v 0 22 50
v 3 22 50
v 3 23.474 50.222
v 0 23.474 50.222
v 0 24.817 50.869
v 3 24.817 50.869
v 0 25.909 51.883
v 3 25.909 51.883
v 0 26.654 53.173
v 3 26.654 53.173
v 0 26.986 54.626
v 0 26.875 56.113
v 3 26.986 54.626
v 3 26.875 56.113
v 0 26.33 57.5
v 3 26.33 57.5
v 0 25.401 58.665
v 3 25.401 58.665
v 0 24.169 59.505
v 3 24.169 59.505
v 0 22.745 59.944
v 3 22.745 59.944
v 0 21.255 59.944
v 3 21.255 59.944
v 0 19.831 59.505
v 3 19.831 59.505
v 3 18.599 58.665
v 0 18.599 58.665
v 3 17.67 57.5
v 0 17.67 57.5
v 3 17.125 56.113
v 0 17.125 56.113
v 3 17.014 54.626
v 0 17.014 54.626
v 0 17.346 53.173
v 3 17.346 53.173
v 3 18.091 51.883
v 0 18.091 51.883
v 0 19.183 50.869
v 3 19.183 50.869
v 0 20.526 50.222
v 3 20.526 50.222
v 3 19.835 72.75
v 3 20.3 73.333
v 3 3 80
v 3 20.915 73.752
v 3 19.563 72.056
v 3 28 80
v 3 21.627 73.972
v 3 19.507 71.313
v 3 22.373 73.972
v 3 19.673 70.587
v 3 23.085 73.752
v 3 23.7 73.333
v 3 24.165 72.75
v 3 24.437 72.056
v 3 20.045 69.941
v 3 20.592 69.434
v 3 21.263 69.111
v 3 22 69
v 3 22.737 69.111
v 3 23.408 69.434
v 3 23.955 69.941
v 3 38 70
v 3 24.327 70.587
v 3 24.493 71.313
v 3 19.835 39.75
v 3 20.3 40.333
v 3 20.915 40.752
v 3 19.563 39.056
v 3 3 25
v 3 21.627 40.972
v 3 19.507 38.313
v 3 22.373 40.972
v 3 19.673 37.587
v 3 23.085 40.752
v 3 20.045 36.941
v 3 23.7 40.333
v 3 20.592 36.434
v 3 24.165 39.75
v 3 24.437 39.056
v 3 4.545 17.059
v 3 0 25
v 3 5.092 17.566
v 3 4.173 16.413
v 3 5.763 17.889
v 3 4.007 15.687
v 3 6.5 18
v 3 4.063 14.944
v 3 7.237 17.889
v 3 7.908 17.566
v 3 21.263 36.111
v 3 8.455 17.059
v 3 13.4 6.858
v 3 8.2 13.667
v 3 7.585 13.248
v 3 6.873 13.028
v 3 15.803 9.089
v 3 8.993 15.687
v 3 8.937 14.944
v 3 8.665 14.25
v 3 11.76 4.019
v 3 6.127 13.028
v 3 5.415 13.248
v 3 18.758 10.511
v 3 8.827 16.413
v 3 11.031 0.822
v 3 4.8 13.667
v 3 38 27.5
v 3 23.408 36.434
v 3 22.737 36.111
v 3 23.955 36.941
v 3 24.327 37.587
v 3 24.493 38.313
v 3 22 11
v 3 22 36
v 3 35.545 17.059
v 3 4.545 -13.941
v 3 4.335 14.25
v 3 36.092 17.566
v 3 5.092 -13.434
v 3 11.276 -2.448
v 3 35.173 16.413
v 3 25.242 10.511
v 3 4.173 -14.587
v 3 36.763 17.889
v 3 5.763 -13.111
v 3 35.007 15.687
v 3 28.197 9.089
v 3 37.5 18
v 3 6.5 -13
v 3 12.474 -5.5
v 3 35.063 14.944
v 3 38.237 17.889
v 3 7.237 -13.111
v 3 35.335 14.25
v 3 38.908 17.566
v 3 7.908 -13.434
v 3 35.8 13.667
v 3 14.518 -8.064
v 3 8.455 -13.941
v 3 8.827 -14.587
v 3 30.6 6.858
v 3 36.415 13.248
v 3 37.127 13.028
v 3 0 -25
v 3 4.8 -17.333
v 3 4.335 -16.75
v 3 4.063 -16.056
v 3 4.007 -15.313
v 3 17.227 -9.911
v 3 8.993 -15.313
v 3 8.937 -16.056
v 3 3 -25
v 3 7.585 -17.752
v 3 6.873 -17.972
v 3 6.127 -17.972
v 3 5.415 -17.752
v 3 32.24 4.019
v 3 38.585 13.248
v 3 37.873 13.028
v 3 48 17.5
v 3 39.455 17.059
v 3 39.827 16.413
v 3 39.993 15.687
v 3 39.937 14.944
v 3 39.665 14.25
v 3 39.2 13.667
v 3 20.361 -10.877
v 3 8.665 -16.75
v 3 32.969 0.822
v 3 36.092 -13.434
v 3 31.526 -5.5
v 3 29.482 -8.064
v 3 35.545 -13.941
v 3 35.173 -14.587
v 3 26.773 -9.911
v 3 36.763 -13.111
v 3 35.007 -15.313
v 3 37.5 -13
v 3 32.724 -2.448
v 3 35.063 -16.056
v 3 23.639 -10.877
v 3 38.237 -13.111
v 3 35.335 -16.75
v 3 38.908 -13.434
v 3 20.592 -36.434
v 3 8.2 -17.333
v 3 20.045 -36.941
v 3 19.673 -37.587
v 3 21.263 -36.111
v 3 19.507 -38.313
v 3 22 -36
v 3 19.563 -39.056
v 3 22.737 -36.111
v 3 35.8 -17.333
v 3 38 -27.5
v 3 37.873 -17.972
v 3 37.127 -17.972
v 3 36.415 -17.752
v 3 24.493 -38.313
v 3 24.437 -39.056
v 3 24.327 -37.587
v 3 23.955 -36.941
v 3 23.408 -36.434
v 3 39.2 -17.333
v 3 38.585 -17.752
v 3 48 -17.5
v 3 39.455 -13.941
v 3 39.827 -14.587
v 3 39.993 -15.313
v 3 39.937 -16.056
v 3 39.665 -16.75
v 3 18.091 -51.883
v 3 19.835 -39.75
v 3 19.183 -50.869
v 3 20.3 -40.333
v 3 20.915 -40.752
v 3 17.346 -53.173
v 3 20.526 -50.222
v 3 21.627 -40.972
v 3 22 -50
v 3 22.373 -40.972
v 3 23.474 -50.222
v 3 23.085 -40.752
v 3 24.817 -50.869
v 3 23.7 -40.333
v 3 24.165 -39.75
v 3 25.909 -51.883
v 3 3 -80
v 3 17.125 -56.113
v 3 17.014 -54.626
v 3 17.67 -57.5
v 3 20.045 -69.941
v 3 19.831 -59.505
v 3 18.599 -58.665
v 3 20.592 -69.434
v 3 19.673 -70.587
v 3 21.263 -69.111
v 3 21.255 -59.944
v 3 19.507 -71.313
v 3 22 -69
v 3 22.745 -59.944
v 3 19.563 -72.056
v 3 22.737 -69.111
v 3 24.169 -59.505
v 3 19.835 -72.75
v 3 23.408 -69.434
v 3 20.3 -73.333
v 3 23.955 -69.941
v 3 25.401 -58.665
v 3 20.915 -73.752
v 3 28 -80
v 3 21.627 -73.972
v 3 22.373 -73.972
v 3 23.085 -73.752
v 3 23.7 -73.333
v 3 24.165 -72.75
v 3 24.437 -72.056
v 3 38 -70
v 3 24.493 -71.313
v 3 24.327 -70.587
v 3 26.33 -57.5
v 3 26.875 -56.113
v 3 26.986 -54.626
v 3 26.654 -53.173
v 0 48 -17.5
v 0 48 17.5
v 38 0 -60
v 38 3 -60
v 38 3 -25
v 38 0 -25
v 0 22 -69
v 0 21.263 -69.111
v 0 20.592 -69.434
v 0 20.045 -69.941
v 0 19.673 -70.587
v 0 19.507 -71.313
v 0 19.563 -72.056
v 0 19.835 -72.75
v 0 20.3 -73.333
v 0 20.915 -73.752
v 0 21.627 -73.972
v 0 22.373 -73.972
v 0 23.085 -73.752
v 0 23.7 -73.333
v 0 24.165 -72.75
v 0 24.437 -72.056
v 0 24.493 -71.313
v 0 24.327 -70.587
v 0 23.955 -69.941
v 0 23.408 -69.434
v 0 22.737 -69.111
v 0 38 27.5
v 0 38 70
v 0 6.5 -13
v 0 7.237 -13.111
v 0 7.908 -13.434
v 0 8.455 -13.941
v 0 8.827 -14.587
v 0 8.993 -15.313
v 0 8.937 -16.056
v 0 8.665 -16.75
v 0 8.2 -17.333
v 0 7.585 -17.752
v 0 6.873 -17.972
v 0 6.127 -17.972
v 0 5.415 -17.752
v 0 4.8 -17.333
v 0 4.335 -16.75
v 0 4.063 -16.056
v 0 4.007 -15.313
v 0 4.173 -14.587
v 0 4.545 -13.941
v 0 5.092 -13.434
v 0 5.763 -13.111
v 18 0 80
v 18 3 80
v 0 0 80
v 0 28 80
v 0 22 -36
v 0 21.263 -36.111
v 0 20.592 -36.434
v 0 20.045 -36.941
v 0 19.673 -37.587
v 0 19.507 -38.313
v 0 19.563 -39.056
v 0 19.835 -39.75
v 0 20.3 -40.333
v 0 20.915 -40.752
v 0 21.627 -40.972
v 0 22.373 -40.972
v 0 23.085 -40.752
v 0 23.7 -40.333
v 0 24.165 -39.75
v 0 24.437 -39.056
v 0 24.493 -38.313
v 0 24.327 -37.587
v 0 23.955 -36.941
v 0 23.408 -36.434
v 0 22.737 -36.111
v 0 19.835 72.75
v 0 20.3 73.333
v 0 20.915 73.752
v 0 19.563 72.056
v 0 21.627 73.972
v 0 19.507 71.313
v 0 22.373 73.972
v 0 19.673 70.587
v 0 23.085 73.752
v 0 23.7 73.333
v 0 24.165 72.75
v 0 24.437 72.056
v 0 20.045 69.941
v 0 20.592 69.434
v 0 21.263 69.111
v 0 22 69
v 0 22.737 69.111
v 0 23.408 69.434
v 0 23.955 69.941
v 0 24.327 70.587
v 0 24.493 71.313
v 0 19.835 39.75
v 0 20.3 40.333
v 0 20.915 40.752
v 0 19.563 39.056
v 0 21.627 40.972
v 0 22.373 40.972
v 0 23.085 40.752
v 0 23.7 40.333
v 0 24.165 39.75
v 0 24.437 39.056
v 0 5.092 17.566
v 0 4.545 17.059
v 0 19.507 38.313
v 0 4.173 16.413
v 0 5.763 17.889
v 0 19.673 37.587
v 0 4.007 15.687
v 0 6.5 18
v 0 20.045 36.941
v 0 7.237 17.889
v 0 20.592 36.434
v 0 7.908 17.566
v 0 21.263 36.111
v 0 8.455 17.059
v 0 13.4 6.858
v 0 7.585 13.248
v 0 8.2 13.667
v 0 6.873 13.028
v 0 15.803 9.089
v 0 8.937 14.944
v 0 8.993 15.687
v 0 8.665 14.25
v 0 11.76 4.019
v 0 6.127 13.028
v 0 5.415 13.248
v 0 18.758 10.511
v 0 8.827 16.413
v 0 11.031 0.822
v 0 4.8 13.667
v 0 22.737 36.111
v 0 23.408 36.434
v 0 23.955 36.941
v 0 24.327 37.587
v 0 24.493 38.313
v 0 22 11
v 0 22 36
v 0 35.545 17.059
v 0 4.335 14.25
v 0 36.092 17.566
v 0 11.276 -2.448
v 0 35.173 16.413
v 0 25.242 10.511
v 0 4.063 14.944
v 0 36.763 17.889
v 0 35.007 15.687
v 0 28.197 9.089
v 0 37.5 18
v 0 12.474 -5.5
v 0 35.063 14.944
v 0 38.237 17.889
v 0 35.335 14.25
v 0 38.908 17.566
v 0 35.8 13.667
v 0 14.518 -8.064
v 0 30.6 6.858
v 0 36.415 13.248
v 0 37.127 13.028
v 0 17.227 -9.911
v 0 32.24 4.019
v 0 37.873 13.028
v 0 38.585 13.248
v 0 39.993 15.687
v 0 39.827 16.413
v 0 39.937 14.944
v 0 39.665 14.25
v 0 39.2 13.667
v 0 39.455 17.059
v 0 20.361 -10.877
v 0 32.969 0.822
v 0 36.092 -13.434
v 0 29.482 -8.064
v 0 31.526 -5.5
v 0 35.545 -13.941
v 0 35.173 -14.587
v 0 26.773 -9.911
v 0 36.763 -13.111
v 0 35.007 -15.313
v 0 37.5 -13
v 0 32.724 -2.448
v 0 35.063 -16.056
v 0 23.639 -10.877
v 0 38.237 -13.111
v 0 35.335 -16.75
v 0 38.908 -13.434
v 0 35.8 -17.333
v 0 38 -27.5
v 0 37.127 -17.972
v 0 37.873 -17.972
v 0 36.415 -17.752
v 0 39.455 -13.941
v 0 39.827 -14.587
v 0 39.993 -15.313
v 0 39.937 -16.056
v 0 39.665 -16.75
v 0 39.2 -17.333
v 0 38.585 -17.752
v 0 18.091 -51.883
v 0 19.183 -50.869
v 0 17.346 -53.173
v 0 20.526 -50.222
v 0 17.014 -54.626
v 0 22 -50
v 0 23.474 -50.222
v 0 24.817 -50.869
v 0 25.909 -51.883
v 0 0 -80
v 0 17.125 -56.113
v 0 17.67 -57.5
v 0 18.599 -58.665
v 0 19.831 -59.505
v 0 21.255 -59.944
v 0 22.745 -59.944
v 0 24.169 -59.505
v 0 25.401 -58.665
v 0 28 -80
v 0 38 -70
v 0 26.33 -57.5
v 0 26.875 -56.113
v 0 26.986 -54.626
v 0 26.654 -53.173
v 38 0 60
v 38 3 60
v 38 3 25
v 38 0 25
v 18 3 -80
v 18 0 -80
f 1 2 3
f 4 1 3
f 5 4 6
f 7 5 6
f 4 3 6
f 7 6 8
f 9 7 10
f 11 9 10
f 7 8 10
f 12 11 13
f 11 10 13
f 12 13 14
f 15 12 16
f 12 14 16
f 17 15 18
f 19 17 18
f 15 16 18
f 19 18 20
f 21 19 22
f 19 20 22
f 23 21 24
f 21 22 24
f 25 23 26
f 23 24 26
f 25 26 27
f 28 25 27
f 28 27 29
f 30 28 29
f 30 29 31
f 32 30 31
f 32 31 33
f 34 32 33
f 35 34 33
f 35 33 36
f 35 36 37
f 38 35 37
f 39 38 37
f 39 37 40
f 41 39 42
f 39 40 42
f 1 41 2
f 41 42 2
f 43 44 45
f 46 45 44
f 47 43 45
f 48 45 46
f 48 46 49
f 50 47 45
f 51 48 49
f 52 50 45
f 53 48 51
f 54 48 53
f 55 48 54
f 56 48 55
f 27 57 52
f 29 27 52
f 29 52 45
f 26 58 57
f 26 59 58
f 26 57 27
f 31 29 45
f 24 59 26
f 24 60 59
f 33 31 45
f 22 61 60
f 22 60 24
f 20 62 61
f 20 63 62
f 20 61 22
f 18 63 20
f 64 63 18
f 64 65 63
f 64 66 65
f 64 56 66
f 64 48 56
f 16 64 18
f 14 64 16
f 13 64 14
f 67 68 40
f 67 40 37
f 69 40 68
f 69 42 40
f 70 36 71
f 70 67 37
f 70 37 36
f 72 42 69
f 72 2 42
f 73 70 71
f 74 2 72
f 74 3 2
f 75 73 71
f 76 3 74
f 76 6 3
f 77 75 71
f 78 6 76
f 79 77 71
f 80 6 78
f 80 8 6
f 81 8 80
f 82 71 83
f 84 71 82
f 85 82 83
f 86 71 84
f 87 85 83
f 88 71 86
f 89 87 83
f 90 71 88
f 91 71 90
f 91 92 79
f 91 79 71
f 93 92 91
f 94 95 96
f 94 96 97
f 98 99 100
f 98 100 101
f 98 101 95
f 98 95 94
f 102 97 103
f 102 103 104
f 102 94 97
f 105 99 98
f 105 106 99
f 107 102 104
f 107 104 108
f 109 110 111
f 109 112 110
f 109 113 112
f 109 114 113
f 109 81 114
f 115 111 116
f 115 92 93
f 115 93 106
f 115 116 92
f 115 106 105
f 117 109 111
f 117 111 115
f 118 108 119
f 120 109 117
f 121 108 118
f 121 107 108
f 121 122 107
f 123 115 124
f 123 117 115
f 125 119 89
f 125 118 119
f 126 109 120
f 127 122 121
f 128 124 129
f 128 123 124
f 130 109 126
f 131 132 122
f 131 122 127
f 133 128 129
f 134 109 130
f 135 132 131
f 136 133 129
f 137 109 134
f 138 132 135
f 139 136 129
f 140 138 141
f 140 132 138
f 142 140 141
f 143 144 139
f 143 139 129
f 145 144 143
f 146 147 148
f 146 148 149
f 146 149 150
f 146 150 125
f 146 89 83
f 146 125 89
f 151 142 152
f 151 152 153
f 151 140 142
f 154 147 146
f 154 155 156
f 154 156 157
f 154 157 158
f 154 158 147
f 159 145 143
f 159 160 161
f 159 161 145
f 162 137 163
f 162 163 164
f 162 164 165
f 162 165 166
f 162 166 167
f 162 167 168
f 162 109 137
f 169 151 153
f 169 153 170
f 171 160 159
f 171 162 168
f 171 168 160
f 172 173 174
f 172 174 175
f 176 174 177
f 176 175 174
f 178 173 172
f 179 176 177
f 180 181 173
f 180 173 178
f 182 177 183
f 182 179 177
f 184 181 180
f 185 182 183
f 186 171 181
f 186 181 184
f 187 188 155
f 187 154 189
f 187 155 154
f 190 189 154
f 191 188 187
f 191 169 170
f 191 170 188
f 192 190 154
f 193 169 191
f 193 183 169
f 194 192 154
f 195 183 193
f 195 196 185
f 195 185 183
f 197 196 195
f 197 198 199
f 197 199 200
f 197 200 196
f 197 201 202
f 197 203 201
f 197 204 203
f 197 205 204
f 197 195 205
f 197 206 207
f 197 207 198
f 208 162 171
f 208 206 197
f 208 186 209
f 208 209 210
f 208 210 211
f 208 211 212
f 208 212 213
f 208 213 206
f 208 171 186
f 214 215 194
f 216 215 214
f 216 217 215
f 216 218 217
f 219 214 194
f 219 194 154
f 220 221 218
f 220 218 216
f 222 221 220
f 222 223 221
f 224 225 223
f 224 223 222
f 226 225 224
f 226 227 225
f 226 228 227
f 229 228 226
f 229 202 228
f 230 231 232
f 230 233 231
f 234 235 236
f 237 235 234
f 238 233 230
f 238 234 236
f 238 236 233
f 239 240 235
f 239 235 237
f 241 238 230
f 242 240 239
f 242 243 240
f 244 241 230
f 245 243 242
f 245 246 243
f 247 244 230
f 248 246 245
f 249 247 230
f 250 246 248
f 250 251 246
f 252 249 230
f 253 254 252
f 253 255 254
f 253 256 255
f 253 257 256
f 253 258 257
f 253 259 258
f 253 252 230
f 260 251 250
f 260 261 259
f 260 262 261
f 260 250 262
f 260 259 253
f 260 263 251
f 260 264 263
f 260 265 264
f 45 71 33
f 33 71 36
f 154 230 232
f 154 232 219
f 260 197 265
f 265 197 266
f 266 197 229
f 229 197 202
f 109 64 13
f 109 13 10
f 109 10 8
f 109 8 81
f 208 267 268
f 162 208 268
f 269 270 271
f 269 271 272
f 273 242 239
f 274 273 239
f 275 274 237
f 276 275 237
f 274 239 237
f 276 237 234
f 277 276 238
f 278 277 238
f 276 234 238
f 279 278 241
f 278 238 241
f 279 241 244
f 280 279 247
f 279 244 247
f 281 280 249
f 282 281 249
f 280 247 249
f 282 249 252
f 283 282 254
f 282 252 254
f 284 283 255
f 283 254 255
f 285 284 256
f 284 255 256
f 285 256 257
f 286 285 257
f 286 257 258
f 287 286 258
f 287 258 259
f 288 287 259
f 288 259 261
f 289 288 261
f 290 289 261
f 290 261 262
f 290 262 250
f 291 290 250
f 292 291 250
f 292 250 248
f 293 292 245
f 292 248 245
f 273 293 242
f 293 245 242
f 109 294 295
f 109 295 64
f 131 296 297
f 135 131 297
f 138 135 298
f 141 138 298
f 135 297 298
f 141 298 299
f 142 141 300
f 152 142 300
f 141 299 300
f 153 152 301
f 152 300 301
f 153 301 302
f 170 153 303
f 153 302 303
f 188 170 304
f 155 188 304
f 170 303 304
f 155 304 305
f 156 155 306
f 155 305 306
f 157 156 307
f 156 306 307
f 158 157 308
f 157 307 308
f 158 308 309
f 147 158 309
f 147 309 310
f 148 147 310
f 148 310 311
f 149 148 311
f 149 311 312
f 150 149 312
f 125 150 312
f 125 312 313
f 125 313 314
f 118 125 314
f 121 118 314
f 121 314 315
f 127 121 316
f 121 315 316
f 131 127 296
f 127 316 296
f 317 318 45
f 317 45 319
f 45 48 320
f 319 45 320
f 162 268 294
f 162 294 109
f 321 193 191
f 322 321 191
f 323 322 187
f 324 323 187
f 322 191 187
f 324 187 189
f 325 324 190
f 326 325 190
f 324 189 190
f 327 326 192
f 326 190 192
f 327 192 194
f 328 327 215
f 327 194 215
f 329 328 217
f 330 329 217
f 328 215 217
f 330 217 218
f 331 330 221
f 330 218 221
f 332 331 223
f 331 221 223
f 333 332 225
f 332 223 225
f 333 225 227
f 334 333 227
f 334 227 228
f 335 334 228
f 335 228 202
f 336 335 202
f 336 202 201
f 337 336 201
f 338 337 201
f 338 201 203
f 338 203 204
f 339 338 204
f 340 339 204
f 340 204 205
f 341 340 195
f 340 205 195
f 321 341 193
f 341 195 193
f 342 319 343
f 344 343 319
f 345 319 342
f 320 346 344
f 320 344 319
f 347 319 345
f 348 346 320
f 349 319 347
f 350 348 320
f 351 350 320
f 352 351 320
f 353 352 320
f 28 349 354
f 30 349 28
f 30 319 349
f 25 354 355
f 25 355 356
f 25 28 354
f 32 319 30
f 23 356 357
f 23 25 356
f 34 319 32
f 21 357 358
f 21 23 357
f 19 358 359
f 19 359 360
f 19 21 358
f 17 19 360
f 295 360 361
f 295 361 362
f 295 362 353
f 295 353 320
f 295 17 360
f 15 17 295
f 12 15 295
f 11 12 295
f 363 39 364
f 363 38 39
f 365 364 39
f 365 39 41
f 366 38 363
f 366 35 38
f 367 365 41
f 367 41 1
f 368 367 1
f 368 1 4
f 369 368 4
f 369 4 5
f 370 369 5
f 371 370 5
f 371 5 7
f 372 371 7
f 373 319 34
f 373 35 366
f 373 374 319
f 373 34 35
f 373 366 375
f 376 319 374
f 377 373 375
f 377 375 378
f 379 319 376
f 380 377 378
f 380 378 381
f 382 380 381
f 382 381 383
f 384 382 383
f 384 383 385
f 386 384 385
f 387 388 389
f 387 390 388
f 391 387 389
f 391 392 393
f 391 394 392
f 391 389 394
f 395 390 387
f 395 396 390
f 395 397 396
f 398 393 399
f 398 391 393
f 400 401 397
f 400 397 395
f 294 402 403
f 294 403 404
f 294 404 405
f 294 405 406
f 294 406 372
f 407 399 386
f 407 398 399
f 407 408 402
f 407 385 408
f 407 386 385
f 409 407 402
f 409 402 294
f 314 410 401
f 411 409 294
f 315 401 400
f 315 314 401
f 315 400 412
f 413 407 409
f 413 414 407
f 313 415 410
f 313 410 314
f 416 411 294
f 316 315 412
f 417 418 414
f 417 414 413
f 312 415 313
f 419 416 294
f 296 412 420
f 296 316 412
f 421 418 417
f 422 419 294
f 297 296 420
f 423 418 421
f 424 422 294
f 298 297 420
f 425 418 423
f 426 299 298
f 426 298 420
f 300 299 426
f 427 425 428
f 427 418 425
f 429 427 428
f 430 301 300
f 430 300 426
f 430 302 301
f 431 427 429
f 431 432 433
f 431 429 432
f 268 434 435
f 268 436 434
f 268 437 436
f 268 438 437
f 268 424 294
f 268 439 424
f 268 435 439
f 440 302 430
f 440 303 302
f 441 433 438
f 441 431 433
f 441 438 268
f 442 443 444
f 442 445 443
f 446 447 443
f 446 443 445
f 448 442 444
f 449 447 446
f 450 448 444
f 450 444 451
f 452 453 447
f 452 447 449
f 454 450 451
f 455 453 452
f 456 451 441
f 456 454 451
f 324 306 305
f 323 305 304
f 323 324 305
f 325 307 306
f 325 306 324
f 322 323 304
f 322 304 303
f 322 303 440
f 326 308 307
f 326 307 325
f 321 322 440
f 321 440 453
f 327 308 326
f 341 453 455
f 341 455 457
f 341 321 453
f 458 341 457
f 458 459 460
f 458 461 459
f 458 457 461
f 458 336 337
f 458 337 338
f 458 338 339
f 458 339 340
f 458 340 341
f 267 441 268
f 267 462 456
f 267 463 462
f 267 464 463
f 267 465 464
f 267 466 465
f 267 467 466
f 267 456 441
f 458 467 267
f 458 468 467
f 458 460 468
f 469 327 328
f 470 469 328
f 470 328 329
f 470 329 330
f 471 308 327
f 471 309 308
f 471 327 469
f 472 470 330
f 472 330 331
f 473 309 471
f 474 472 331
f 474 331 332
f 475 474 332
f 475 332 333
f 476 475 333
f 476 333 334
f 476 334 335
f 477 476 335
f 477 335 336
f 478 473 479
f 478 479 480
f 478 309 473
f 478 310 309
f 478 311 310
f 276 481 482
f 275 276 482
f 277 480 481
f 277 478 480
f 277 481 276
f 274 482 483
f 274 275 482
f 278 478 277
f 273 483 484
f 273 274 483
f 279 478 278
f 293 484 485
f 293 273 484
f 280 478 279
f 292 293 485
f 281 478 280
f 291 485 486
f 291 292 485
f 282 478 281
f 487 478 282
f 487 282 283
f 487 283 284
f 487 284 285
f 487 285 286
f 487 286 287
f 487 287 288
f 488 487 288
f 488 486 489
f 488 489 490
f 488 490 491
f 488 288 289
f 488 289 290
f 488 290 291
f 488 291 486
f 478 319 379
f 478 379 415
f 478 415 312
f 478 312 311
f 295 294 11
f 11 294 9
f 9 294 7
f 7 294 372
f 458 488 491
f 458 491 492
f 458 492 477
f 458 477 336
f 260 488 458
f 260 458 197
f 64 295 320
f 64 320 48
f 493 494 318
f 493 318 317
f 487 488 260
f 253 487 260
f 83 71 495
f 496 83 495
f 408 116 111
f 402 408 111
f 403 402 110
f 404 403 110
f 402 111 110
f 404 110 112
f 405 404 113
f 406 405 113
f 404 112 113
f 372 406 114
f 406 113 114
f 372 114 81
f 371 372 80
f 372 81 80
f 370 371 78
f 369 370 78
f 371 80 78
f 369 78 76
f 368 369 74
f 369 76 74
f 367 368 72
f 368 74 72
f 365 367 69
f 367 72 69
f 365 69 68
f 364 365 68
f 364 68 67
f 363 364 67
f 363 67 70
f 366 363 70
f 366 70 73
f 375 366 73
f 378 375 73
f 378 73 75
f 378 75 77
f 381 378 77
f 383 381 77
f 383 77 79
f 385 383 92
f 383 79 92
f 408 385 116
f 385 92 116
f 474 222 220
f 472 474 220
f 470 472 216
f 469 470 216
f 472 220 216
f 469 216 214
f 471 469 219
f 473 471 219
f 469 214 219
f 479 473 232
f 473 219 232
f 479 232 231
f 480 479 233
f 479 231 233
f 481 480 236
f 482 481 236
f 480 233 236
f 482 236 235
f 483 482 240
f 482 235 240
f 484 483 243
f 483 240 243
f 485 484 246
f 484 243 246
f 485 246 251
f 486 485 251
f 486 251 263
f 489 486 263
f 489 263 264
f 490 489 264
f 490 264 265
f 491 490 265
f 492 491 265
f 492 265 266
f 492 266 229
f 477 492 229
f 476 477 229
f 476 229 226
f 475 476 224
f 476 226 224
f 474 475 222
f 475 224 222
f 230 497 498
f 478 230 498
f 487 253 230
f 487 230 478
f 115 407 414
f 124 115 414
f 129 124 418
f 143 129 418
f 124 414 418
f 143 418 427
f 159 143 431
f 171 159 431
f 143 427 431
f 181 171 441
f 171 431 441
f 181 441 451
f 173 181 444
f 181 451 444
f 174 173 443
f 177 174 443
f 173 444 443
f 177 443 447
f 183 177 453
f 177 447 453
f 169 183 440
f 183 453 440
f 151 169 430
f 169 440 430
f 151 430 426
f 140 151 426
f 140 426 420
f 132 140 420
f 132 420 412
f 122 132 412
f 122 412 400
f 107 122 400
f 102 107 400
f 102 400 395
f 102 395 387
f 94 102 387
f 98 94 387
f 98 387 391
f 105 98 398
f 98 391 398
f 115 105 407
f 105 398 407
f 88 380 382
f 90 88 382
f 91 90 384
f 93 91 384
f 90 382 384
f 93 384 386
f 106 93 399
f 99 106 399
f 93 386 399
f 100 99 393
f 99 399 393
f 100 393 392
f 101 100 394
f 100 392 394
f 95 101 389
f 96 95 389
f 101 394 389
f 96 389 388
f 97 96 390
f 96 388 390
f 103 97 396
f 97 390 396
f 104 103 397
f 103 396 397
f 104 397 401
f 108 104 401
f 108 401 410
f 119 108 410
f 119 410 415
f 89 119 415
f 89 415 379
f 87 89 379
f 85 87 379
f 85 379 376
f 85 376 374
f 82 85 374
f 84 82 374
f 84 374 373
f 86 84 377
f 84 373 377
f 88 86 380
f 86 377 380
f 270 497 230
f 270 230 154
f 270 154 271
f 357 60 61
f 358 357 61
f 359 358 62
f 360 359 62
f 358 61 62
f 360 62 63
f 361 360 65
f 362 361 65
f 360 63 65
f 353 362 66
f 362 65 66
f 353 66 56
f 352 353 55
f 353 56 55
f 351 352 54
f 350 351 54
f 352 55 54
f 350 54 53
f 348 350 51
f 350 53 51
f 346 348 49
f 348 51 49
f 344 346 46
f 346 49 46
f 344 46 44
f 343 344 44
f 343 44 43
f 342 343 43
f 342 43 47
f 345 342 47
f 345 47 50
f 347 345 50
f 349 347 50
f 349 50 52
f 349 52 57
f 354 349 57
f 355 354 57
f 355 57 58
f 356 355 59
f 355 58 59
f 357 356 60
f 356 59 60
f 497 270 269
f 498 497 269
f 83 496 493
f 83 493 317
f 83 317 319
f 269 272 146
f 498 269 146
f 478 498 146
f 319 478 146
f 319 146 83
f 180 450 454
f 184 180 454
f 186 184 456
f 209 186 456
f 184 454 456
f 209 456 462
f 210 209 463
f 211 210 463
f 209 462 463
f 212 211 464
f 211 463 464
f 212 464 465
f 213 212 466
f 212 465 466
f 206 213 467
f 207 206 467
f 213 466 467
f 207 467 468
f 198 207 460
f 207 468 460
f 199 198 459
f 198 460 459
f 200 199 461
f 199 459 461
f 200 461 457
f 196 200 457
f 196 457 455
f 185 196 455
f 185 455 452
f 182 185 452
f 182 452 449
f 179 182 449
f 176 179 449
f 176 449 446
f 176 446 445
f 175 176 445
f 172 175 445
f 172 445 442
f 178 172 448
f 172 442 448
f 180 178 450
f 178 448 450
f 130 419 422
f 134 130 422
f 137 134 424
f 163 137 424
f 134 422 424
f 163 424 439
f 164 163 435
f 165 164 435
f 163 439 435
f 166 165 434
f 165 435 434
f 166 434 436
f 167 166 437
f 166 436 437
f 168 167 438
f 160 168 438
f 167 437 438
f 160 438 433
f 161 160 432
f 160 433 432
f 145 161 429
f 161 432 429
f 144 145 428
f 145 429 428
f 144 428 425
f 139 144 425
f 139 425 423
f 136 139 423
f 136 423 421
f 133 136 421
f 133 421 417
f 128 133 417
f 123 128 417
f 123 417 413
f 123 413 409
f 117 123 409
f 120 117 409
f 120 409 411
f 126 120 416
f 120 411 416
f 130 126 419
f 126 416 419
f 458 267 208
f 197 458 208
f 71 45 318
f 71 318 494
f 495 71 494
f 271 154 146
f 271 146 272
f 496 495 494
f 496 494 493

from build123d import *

# Parameters (mm, degrees)
SALIENTE_EXTRUIR1_DEPTH      = 80
SALIENTE_EXTRUIR1_DEPTH_BACK = 80
CROQUIS2_W                   = 35
CROQUIS2_H                   = 50
CORTAR_EXTRUIR1_DEPTH        = 3
CHAFL_N1_SIZE                = 20
CROQUIS3_R                   = 5
CROQUIS3_R_2                 = 2.5
CORTAR_EXTRUIR2_DEPTH        = 3
CROQUIS4_W                   = 55
CROQUIS4_H                   = 10
SALIENTE_EXTRUIR2_DEPTH      = 3
CROQUIS5_R                   = 2.5
CROQUIS5_R_2                 = 11
CORTAR_EXTRUIR3_DEPTH        = 3
CHAFL_N2_SIZE                = 10


with BuildPart() as part:
    # Croquis1 → Saliente-Extruir1 (new, two sides: drawn at the far end of the back side and taken through both)
    with BuildSketch(Plane.XY.offset(-SALIENTE_EXTRUIR1_DEPTH_BACK)):
        Polygon((0, 0), (0, 38), (3, 38), (3, 3), (38, 3), (38, 0), align=None)
    extrude(amount=SALIENTE_EXTRUIR1_DEPTH + SALIENTE_EXTRUIR1_DEPTH_BACK)

    # Croquis2 → Cortar-Extruir1 (cut)
    with BuildSketch(Plane(origin=(0, 3, 0), x_dir=(1, 0, 0), z_dir=(0, 1, 0))):
        with Locations((20.5, 0)):
            Rectangle(CROQUIS2_W, CROQUIS2_H)
    extrude(amount=-CORTAR_EXTRUIR1_DEPTH, mode=Mode.SUBTRACT)

    # Chaflán1
    chafl_n1_edges = [part.edges().sort_by_distance(p)[0] for p in [
        (38, 1.5, 80),
        (38, 1.5, -80),
    ]]
    chamfer(chafl_n1_edges, length=CHAFL_N1_SIZE)

    # Croquis3 → Cortar-Extruir2 (cut)
    with BuildSketch(Plane(origin=(3, 0, 0), x_dir=(0, 0, -1), z_dir=(1, 0, 0))):
        with Locations((-55, 22)):
            Circle(CROQUIS3_R)
        with Locations((-71.5, 22)):
            Circle(CROQUIS3_R_2)
        with Locations((-38.5, 22)):
            Circle(CROQUIS3_R_2)
        with Locations(Location((38.5, 22, 0), (0, 0, 180))):
            Circle(CROQUIS3_R_2)
        with Locations(Location((55, 22, 0), (0, 0, 180))):
            Circle(CROQUIS3_R)
        with Locations(Location((71.5, 22, 0), (0, 0, 180))):
            Circle(CROQUIS3_R_2)
    extrude(amount=-CORTAR_EXTRUIR2_DEPTH, mode=Mode.SUBTRACT)

    # Croquis4 → Saliente-Extruir2 (add)
    with BuildSketch(Plane.ZY):
        with Locations((0, 43)):
            Rectangle(CROQUIS4_W, CROQUIS4_H)
    extrude(amount=-SALIENTE_EXTRUIR2_DEPTH)

    # Croquis5 → Cortar-Extruir3 (cut)
    with BuildSketch(Plane.ZY):
        with Locations((-15.5, 37.5)):
            Circle(CROQUIS5_R)
        with Locations((15.5, 37.5)):
            Circle(CROQUIS5_R)
        with Locations((15.5, 6.5)):
            Circle(CROQUIS5_R)
        with Locations((-15.5, 6.5)):
            Circle(CROQUIS5_R)
        with Locations((0, 22)):
            Circle(CROQUIS5_R_2)
    extrude(amount=-CORTAR_EXTRUIR3_DEPTH, mode=Mode.SUBTRACT)

    # Chaflán2
    chafl_n2_edges = [part.edges().sort_by_distance(p)[0] for p in [
        (1.5, 38, 80),
        (1.5, 38, -80),
        (1.5, 48, -27.5),
        (1.5, 48, 27.5),
    ]]
    chamfer(chafl_n2_edges, length=CHAFL_N2_SIZE - 0.0001)  # a hair under: the kernel refuses the full size


solid = part.part
